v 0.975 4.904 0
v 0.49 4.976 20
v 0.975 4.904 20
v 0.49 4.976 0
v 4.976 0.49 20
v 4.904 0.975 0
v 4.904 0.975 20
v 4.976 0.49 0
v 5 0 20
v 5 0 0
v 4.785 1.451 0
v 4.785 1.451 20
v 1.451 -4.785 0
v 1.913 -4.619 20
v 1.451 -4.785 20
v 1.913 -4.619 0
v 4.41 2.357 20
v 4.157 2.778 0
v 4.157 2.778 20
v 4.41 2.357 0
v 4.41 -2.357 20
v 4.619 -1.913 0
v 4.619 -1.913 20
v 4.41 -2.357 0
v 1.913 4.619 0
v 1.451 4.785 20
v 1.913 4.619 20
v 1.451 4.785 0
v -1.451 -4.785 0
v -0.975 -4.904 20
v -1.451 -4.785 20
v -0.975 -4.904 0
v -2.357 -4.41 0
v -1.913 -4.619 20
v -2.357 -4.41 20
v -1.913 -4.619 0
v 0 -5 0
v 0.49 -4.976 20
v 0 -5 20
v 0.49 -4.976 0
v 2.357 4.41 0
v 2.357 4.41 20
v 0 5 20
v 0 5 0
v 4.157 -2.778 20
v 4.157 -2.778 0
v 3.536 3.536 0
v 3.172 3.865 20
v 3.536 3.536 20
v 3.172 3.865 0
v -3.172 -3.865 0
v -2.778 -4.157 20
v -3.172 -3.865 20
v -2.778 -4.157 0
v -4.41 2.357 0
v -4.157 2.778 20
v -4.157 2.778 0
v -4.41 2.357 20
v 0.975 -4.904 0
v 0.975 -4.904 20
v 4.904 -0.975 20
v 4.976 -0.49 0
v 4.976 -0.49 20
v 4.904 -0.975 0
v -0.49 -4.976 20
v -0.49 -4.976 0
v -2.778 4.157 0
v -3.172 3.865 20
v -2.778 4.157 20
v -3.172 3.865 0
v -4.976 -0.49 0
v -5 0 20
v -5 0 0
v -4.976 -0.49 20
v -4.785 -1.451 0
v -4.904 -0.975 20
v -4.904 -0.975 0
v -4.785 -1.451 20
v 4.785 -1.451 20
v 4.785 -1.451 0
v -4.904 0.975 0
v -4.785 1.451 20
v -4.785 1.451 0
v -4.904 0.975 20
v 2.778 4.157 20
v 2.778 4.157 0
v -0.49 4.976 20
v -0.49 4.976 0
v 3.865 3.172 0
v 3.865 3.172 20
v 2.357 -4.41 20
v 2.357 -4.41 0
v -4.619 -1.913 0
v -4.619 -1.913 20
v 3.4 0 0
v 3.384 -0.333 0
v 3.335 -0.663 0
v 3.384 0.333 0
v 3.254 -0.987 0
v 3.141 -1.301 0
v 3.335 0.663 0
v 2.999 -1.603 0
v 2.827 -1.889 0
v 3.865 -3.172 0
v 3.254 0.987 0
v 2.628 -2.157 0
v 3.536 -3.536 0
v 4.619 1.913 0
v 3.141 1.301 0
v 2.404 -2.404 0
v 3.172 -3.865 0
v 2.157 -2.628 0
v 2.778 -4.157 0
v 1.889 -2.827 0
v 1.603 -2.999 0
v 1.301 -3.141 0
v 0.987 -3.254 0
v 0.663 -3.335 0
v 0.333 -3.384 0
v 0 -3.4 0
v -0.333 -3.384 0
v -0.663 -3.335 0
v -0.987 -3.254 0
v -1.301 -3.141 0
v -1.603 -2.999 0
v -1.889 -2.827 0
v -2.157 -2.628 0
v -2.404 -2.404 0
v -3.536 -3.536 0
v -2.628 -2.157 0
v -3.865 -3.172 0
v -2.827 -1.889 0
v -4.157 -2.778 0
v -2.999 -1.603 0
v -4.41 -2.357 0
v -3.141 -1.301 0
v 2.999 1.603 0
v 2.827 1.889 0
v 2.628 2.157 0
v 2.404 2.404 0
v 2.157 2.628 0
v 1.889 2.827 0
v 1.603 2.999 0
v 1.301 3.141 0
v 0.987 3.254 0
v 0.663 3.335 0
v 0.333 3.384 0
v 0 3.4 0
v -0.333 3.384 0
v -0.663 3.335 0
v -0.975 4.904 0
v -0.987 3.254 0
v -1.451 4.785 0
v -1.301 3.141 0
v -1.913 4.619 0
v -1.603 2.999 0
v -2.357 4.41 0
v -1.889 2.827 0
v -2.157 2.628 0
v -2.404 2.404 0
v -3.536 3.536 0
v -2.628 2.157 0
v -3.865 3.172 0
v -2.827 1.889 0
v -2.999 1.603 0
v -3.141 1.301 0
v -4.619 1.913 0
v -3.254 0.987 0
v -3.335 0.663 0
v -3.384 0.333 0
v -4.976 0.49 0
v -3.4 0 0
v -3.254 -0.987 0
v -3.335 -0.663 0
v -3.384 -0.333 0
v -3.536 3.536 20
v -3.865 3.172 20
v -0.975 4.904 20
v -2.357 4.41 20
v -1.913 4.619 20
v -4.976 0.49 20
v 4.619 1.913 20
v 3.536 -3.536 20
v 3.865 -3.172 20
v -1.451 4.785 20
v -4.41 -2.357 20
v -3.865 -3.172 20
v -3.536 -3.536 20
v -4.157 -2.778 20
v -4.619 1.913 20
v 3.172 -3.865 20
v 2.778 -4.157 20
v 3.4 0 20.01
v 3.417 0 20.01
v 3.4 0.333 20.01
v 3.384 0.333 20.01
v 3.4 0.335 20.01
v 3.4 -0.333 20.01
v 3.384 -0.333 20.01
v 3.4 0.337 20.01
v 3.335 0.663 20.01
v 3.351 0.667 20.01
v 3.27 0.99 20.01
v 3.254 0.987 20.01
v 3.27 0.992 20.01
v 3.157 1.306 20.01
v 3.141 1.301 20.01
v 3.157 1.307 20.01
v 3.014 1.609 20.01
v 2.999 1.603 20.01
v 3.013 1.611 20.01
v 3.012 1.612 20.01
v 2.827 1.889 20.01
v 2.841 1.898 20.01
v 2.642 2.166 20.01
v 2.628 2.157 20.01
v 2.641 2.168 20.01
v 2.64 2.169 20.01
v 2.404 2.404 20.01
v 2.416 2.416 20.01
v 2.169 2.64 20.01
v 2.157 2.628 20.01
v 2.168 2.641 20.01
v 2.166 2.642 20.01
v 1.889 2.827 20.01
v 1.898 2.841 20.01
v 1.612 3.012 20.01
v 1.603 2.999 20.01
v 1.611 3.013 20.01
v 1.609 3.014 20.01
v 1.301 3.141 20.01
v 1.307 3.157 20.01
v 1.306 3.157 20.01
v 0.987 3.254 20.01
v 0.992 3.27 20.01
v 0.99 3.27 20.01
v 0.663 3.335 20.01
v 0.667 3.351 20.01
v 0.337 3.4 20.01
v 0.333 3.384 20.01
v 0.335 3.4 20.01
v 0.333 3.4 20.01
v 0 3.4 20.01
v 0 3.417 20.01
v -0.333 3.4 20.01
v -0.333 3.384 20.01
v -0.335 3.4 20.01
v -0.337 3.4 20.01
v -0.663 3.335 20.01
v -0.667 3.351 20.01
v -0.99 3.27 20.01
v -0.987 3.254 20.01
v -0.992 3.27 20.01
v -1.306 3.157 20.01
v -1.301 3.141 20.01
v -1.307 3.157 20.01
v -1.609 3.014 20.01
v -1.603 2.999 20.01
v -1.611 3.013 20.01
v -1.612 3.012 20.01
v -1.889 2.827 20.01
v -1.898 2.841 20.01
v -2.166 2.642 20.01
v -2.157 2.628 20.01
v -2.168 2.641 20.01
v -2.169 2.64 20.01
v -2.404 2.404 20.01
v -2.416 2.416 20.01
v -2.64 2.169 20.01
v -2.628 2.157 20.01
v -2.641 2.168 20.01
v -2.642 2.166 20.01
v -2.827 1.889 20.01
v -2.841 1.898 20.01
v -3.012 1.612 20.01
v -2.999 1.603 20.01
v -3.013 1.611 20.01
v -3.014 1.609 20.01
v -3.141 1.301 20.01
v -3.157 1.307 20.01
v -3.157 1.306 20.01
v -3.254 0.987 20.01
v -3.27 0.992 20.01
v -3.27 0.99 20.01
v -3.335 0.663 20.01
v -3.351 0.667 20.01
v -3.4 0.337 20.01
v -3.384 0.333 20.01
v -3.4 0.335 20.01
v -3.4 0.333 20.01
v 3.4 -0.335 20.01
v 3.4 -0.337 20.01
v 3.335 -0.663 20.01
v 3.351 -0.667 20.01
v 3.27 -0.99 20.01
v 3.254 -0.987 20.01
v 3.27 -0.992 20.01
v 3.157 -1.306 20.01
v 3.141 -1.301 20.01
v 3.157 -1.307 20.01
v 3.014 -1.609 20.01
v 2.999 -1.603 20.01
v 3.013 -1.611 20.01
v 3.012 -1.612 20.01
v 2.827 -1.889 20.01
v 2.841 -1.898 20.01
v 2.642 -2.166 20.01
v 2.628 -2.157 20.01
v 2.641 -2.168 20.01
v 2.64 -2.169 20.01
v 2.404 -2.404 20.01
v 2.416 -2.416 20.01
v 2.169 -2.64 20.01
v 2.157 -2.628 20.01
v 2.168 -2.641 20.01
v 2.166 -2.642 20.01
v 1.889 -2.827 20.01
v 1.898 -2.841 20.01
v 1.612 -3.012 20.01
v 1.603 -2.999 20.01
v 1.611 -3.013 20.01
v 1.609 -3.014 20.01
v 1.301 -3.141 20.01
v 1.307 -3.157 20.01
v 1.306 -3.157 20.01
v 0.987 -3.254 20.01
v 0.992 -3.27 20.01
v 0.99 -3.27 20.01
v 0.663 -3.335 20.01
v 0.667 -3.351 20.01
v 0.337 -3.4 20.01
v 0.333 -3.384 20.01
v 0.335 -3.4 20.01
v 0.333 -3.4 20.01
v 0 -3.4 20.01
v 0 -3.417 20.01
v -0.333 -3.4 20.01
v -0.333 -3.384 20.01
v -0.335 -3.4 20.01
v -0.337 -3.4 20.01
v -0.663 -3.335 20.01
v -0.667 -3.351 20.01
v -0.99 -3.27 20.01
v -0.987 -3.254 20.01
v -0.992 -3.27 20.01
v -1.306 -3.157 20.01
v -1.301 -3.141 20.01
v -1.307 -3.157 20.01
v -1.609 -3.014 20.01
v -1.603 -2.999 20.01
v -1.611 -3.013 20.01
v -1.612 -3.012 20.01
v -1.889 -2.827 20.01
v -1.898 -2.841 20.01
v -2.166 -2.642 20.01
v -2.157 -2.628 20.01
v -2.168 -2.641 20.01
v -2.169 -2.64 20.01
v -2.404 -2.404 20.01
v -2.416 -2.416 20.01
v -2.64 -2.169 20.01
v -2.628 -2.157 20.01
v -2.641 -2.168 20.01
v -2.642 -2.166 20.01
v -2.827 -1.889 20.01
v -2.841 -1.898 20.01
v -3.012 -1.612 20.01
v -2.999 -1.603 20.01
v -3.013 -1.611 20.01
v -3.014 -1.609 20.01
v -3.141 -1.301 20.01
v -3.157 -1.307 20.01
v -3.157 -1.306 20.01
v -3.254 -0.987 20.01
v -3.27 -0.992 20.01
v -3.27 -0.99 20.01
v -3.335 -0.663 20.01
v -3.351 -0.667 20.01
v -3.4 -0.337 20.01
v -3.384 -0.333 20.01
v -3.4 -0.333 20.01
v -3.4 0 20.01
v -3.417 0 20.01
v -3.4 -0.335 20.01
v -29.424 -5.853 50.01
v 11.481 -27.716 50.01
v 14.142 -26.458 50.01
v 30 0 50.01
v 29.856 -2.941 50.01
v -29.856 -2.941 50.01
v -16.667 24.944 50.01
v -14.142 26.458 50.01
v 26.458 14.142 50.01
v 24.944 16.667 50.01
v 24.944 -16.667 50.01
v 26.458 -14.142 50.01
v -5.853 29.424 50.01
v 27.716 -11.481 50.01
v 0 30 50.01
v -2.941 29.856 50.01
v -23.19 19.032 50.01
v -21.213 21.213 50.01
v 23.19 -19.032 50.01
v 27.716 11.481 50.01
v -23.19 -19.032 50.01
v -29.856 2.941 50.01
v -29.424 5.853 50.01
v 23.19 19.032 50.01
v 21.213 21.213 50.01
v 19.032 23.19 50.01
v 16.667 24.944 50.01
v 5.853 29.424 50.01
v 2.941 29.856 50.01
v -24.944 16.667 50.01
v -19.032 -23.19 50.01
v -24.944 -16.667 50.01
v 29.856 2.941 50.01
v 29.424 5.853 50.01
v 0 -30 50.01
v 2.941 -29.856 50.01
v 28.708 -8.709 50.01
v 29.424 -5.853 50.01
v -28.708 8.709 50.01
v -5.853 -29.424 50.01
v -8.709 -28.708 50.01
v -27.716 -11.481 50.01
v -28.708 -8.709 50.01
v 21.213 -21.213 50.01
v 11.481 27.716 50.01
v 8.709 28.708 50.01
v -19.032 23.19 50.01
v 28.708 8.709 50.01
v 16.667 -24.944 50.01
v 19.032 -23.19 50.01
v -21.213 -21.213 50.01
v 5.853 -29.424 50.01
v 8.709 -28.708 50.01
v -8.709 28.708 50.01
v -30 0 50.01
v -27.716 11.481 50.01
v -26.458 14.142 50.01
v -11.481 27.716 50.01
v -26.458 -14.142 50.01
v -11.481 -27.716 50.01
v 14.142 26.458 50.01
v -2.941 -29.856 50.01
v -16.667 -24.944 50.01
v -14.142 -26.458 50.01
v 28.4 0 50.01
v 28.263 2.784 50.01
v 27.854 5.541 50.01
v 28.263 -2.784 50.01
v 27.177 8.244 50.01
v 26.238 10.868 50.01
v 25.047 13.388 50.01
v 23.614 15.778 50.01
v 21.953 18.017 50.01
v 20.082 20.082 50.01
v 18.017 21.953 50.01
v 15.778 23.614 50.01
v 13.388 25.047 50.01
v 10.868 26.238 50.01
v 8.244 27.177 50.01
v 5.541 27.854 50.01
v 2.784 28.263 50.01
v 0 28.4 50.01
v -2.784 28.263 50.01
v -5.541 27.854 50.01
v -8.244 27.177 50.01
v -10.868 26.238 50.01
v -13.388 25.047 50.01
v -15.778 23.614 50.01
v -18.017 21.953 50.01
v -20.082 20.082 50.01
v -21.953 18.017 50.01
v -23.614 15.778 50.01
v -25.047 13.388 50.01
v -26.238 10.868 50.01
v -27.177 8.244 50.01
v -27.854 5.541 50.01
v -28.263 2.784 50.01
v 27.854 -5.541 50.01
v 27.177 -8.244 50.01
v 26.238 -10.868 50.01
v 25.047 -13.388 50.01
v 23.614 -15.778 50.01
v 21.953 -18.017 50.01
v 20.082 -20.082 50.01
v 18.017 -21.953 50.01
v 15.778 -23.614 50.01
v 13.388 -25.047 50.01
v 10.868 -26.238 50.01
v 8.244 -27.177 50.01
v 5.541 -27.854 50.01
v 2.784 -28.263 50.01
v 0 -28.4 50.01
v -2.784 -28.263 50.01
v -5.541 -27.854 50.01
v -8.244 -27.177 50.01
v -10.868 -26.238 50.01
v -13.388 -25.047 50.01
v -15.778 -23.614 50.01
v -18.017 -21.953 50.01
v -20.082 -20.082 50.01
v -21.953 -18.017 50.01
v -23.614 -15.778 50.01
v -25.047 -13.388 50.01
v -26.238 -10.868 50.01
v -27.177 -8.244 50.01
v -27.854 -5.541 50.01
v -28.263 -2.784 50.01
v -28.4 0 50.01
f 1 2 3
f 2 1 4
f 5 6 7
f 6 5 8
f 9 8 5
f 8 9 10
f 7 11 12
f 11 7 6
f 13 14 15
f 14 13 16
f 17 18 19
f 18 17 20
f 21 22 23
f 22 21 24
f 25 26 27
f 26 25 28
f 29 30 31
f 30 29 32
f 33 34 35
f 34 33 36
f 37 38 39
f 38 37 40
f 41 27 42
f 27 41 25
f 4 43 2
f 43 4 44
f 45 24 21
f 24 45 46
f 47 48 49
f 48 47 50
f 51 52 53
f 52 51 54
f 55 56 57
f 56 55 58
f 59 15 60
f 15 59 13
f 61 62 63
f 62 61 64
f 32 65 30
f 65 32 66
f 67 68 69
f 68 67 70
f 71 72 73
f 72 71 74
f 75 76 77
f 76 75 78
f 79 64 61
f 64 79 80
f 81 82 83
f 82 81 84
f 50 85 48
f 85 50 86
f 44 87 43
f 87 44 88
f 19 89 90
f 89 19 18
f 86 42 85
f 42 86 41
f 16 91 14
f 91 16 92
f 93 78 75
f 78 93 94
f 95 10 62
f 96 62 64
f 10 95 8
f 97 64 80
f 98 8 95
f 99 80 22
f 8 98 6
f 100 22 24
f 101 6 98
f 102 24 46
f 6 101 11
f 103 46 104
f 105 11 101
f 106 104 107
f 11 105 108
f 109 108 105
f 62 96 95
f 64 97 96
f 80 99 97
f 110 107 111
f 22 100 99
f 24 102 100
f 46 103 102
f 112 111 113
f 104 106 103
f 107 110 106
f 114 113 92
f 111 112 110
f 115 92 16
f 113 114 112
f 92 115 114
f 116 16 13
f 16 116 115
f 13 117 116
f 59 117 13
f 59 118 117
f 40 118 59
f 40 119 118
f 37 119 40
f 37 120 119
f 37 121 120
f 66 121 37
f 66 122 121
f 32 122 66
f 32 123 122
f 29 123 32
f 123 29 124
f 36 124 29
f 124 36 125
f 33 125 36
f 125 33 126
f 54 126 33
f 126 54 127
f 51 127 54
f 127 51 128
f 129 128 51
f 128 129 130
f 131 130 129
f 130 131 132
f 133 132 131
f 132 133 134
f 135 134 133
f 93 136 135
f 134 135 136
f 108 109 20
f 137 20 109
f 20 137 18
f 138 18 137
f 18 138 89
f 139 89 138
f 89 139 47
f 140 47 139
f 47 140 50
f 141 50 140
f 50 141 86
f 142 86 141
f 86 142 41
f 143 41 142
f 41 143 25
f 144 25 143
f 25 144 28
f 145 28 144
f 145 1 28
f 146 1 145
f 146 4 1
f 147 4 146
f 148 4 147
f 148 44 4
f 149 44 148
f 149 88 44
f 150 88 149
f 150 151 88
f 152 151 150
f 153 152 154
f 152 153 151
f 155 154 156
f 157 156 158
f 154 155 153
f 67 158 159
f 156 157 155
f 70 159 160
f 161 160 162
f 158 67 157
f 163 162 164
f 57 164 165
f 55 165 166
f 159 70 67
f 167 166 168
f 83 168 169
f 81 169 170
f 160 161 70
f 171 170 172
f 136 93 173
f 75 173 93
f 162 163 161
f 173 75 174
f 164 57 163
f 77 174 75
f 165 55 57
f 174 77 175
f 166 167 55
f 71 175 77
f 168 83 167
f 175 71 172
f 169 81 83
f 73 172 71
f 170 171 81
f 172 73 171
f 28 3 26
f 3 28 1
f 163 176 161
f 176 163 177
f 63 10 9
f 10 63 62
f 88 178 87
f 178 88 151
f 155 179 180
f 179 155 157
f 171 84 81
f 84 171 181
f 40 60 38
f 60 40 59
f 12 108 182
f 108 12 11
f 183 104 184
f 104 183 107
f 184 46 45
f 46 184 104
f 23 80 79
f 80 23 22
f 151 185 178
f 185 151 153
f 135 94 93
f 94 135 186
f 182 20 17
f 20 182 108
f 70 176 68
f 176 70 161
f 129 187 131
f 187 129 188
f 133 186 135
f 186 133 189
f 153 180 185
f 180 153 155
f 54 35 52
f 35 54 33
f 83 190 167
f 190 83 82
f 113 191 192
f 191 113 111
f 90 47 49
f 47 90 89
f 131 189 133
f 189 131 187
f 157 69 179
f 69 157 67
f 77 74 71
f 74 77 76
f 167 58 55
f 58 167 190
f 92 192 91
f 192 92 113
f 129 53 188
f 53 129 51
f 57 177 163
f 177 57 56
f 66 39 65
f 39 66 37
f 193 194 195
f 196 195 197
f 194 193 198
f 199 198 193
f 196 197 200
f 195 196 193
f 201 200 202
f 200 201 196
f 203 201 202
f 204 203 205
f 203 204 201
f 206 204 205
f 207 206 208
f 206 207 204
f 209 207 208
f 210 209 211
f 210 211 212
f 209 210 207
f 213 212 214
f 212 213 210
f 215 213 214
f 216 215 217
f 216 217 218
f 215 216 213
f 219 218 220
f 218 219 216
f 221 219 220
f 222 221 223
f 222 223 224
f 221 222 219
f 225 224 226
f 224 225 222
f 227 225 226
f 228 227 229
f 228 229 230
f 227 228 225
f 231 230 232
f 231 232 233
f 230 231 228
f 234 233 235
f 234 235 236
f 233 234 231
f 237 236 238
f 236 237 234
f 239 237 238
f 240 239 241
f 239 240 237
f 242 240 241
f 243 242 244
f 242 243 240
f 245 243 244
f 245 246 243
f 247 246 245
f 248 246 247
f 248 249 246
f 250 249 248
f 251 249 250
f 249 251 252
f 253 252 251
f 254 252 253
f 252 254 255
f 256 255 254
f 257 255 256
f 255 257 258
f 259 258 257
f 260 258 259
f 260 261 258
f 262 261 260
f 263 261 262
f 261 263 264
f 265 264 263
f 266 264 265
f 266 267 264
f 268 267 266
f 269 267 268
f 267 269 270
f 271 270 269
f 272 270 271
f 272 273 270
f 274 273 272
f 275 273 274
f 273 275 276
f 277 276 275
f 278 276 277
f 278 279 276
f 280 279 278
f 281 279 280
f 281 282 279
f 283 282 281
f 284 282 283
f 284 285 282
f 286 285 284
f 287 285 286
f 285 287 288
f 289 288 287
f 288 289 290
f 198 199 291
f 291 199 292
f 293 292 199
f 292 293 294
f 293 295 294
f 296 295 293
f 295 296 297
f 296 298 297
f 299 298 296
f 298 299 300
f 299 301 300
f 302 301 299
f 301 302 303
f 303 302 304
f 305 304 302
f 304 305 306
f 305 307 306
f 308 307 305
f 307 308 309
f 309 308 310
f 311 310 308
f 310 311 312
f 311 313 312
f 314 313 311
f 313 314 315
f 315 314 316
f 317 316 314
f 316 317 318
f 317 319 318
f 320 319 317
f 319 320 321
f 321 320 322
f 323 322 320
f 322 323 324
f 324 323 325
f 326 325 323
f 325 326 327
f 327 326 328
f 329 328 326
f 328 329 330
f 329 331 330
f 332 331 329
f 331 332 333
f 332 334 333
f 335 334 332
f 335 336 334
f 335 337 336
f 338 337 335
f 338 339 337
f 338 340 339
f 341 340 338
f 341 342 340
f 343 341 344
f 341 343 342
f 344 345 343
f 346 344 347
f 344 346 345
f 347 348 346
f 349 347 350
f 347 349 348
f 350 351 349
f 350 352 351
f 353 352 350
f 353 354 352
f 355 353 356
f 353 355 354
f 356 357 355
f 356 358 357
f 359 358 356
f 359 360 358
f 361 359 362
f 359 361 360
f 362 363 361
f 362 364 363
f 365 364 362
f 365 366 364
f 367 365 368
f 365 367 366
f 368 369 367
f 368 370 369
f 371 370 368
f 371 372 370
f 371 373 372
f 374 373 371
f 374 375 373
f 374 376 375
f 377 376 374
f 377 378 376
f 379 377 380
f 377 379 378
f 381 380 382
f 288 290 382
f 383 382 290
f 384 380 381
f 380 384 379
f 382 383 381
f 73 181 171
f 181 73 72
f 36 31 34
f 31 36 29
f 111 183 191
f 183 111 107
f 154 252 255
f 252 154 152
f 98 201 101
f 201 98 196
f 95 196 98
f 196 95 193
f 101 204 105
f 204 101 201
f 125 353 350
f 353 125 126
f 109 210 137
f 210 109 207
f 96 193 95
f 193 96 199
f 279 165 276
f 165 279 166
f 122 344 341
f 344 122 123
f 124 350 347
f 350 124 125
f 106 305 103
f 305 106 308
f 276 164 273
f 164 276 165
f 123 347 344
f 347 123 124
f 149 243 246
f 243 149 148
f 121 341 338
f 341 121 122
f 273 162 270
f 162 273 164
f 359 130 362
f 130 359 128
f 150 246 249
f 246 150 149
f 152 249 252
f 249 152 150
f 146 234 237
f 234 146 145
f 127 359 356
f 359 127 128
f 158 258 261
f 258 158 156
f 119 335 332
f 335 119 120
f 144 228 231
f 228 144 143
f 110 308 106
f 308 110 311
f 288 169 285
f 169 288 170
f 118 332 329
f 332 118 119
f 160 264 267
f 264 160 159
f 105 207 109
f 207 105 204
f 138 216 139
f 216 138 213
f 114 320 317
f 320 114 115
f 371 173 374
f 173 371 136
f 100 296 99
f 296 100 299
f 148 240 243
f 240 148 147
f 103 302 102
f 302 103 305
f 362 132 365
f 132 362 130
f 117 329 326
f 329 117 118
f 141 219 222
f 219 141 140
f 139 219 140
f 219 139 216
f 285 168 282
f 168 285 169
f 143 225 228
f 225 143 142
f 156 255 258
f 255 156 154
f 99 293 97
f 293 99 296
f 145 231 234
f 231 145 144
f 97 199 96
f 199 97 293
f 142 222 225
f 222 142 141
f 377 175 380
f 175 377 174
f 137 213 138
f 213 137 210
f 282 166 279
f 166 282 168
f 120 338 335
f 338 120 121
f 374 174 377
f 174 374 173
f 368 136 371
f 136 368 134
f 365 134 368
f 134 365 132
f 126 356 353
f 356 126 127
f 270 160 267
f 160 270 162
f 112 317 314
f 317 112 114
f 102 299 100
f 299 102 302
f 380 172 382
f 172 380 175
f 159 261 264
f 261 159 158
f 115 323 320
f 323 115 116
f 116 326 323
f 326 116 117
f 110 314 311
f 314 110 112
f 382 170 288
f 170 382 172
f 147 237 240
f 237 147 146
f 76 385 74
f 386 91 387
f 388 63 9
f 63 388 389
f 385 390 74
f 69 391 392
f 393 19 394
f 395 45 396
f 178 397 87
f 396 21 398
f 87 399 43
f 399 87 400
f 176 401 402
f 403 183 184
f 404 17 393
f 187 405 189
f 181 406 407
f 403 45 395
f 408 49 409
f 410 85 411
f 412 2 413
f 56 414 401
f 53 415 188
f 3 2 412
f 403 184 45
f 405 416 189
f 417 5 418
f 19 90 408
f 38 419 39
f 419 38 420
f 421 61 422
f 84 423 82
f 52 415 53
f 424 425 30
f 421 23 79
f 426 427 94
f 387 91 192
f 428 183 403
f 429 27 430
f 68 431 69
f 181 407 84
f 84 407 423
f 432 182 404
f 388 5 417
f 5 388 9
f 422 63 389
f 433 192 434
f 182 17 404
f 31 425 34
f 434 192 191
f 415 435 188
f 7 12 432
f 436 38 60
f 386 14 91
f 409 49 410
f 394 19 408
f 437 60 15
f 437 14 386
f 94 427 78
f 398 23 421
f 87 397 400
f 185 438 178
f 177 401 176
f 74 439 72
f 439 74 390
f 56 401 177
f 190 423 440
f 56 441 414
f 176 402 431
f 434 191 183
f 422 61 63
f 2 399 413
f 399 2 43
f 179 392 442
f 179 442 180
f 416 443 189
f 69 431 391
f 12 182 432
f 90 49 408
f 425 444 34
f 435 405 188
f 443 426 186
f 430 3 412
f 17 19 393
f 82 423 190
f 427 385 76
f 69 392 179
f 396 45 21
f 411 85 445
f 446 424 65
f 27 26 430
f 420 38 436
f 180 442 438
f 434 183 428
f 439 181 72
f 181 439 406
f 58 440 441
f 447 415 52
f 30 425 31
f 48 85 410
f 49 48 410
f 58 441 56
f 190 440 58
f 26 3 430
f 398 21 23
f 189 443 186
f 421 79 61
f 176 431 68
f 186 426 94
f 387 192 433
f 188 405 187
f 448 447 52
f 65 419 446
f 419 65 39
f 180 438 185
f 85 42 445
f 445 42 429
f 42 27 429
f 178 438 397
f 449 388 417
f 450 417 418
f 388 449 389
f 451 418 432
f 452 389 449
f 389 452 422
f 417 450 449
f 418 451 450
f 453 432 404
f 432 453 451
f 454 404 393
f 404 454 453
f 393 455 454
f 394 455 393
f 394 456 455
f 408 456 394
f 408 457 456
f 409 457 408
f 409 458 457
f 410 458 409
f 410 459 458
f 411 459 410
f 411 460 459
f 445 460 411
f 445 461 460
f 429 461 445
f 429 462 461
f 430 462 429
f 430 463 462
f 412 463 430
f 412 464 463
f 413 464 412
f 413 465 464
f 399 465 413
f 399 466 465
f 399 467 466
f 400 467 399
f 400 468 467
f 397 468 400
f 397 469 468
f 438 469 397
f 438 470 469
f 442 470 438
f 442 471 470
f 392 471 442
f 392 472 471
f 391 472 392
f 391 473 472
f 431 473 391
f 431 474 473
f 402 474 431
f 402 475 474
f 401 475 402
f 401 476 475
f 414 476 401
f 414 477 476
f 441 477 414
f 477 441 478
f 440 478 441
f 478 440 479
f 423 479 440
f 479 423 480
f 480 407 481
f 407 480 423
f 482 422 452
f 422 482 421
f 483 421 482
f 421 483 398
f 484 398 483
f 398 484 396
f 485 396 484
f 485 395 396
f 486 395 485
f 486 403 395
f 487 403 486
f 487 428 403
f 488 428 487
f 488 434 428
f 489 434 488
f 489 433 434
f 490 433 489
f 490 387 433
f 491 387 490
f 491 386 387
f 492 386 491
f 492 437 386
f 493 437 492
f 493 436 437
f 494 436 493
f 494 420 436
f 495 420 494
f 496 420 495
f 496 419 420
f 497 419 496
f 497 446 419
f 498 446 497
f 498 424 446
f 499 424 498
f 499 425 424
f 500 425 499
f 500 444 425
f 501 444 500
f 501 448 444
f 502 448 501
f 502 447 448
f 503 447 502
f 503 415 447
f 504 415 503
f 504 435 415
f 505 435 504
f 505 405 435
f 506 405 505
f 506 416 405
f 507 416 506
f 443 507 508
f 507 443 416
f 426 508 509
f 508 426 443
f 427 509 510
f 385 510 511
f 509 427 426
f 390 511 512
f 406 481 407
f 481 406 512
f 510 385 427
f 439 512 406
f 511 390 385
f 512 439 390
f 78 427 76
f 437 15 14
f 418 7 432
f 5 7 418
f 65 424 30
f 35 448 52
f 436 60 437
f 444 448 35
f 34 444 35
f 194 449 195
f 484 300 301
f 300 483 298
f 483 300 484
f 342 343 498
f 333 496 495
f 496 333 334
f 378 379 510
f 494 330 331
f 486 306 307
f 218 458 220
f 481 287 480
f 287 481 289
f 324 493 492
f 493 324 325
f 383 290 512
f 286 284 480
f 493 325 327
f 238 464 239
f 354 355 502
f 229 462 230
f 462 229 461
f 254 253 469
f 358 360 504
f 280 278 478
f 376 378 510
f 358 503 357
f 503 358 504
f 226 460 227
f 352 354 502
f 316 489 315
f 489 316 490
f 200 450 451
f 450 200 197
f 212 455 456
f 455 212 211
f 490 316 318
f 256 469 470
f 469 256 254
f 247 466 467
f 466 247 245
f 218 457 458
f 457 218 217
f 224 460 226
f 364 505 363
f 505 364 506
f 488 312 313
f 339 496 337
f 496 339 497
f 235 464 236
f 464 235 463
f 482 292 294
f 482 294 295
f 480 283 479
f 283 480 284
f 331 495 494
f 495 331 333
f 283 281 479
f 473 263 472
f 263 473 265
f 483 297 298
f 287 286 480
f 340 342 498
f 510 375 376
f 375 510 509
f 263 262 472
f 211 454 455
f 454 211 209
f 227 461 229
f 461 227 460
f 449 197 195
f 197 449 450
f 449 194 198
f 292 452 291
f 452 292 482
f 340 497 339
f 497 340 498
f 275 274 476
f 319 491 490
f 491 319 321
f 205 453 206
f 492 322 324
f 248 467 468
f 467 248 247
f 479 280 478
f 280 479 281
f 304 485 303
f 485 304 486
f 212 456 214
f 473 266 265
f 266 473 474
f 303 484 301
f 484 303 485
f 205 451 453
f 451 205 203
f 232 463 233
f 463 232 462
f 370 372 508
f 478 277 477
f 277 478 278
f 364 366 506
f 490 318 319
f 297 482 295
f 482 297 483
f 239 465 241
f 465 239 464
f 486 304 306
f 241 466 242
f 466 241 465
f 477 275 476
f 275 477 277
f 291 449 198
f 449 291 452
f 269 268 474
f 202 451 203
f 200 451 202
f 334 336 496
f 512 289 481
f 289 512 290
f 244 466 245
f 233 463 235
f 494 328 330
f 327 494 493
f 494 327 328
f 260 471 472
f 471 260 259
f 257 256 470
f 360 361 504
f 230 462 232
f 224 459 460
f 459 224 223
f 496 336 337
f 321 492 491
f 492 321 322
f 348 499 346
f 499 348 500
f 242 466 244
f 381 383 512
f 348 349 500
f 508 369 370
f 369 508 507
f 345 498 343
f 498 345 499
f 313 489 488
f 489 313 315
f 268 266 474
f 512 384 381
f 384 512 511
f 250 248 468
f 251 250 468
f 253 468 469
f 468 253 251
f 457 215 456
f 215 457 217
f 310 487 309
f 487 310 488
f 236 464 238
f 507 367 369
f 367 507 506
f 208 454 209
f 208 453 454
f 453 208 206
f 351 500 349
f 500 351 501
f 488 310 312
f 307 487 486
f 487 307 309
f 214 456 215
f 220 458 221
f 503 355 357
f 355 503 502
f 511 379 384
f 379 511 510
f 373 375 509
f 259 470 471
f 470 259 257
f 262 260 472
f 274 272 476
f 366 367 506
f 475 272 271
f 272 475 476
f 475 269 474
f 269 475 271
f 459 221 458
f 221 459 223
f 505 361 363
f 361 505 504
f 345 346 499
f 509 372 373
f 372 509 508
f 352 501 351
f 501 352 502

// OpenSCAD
// Qwen3-Coder-Next (Tiiny store build), main-tiiny lab_funnel_60mm s1 a0: a correct funnel whose cutters
// end ~5e-15 mm short of the rim and spout, sealing the cavity with a skin no printer can make.
// Lab Funnel Design
// Wall thickness: 1.6 mm
// Spout: 10 mm outer diameter, 20 mm tall (z = 0 to z = 20)
// Cone: 10 mm outer diameter at z = 20, 60 mm outer diameter at z = 50

$fn = 64;

wall_thickness = 1.6;
spout_height = 20;
spout_outer_diameter = 10;
spout_inner_diameter = spout_outer_diameter - 2 * wall_thickness;
cone_height = 30; // from z=20 to z=50
cone_top_diameter = spout_outer_diameter;
cone_bottom_diameter = 60;

// Spout (cylinder with hole)
module spout() {
    difference() {
        cylinder(h = spout_height + 0.01, d = spout_outer_diameter, center = false);
        translate([0, 0, -0.01]) 
            cylinder(h = spout_height + 0.02, d = spout_inner_diameter, center = false);
    }
}

// Cone (frustum with hole)
module cone() {
    translate([0, 0, spout_height]) {
        difference() {
            // Outer cone
            cylinder(h = cone_height + 0.01, 
                     r1 = cone_top_diameter / 2, 
                     r2 = cone_bottom_diameter / 2, 
                     center = false);
            // Inner cone (smaller by wall_thickness)
            translate([0, 0, -0.01]) 
                cylinder(h = cone_height + 0.02, 
                         r1 = (cone_top_diameter - 2 * wall_thickness) / 2, 
                         r2 = (cone_bottom_diameter - 2 * wall_thickness) / 2, 
                         center = false);
        }
    }
}

// Build the funnel
spout();
cone();
